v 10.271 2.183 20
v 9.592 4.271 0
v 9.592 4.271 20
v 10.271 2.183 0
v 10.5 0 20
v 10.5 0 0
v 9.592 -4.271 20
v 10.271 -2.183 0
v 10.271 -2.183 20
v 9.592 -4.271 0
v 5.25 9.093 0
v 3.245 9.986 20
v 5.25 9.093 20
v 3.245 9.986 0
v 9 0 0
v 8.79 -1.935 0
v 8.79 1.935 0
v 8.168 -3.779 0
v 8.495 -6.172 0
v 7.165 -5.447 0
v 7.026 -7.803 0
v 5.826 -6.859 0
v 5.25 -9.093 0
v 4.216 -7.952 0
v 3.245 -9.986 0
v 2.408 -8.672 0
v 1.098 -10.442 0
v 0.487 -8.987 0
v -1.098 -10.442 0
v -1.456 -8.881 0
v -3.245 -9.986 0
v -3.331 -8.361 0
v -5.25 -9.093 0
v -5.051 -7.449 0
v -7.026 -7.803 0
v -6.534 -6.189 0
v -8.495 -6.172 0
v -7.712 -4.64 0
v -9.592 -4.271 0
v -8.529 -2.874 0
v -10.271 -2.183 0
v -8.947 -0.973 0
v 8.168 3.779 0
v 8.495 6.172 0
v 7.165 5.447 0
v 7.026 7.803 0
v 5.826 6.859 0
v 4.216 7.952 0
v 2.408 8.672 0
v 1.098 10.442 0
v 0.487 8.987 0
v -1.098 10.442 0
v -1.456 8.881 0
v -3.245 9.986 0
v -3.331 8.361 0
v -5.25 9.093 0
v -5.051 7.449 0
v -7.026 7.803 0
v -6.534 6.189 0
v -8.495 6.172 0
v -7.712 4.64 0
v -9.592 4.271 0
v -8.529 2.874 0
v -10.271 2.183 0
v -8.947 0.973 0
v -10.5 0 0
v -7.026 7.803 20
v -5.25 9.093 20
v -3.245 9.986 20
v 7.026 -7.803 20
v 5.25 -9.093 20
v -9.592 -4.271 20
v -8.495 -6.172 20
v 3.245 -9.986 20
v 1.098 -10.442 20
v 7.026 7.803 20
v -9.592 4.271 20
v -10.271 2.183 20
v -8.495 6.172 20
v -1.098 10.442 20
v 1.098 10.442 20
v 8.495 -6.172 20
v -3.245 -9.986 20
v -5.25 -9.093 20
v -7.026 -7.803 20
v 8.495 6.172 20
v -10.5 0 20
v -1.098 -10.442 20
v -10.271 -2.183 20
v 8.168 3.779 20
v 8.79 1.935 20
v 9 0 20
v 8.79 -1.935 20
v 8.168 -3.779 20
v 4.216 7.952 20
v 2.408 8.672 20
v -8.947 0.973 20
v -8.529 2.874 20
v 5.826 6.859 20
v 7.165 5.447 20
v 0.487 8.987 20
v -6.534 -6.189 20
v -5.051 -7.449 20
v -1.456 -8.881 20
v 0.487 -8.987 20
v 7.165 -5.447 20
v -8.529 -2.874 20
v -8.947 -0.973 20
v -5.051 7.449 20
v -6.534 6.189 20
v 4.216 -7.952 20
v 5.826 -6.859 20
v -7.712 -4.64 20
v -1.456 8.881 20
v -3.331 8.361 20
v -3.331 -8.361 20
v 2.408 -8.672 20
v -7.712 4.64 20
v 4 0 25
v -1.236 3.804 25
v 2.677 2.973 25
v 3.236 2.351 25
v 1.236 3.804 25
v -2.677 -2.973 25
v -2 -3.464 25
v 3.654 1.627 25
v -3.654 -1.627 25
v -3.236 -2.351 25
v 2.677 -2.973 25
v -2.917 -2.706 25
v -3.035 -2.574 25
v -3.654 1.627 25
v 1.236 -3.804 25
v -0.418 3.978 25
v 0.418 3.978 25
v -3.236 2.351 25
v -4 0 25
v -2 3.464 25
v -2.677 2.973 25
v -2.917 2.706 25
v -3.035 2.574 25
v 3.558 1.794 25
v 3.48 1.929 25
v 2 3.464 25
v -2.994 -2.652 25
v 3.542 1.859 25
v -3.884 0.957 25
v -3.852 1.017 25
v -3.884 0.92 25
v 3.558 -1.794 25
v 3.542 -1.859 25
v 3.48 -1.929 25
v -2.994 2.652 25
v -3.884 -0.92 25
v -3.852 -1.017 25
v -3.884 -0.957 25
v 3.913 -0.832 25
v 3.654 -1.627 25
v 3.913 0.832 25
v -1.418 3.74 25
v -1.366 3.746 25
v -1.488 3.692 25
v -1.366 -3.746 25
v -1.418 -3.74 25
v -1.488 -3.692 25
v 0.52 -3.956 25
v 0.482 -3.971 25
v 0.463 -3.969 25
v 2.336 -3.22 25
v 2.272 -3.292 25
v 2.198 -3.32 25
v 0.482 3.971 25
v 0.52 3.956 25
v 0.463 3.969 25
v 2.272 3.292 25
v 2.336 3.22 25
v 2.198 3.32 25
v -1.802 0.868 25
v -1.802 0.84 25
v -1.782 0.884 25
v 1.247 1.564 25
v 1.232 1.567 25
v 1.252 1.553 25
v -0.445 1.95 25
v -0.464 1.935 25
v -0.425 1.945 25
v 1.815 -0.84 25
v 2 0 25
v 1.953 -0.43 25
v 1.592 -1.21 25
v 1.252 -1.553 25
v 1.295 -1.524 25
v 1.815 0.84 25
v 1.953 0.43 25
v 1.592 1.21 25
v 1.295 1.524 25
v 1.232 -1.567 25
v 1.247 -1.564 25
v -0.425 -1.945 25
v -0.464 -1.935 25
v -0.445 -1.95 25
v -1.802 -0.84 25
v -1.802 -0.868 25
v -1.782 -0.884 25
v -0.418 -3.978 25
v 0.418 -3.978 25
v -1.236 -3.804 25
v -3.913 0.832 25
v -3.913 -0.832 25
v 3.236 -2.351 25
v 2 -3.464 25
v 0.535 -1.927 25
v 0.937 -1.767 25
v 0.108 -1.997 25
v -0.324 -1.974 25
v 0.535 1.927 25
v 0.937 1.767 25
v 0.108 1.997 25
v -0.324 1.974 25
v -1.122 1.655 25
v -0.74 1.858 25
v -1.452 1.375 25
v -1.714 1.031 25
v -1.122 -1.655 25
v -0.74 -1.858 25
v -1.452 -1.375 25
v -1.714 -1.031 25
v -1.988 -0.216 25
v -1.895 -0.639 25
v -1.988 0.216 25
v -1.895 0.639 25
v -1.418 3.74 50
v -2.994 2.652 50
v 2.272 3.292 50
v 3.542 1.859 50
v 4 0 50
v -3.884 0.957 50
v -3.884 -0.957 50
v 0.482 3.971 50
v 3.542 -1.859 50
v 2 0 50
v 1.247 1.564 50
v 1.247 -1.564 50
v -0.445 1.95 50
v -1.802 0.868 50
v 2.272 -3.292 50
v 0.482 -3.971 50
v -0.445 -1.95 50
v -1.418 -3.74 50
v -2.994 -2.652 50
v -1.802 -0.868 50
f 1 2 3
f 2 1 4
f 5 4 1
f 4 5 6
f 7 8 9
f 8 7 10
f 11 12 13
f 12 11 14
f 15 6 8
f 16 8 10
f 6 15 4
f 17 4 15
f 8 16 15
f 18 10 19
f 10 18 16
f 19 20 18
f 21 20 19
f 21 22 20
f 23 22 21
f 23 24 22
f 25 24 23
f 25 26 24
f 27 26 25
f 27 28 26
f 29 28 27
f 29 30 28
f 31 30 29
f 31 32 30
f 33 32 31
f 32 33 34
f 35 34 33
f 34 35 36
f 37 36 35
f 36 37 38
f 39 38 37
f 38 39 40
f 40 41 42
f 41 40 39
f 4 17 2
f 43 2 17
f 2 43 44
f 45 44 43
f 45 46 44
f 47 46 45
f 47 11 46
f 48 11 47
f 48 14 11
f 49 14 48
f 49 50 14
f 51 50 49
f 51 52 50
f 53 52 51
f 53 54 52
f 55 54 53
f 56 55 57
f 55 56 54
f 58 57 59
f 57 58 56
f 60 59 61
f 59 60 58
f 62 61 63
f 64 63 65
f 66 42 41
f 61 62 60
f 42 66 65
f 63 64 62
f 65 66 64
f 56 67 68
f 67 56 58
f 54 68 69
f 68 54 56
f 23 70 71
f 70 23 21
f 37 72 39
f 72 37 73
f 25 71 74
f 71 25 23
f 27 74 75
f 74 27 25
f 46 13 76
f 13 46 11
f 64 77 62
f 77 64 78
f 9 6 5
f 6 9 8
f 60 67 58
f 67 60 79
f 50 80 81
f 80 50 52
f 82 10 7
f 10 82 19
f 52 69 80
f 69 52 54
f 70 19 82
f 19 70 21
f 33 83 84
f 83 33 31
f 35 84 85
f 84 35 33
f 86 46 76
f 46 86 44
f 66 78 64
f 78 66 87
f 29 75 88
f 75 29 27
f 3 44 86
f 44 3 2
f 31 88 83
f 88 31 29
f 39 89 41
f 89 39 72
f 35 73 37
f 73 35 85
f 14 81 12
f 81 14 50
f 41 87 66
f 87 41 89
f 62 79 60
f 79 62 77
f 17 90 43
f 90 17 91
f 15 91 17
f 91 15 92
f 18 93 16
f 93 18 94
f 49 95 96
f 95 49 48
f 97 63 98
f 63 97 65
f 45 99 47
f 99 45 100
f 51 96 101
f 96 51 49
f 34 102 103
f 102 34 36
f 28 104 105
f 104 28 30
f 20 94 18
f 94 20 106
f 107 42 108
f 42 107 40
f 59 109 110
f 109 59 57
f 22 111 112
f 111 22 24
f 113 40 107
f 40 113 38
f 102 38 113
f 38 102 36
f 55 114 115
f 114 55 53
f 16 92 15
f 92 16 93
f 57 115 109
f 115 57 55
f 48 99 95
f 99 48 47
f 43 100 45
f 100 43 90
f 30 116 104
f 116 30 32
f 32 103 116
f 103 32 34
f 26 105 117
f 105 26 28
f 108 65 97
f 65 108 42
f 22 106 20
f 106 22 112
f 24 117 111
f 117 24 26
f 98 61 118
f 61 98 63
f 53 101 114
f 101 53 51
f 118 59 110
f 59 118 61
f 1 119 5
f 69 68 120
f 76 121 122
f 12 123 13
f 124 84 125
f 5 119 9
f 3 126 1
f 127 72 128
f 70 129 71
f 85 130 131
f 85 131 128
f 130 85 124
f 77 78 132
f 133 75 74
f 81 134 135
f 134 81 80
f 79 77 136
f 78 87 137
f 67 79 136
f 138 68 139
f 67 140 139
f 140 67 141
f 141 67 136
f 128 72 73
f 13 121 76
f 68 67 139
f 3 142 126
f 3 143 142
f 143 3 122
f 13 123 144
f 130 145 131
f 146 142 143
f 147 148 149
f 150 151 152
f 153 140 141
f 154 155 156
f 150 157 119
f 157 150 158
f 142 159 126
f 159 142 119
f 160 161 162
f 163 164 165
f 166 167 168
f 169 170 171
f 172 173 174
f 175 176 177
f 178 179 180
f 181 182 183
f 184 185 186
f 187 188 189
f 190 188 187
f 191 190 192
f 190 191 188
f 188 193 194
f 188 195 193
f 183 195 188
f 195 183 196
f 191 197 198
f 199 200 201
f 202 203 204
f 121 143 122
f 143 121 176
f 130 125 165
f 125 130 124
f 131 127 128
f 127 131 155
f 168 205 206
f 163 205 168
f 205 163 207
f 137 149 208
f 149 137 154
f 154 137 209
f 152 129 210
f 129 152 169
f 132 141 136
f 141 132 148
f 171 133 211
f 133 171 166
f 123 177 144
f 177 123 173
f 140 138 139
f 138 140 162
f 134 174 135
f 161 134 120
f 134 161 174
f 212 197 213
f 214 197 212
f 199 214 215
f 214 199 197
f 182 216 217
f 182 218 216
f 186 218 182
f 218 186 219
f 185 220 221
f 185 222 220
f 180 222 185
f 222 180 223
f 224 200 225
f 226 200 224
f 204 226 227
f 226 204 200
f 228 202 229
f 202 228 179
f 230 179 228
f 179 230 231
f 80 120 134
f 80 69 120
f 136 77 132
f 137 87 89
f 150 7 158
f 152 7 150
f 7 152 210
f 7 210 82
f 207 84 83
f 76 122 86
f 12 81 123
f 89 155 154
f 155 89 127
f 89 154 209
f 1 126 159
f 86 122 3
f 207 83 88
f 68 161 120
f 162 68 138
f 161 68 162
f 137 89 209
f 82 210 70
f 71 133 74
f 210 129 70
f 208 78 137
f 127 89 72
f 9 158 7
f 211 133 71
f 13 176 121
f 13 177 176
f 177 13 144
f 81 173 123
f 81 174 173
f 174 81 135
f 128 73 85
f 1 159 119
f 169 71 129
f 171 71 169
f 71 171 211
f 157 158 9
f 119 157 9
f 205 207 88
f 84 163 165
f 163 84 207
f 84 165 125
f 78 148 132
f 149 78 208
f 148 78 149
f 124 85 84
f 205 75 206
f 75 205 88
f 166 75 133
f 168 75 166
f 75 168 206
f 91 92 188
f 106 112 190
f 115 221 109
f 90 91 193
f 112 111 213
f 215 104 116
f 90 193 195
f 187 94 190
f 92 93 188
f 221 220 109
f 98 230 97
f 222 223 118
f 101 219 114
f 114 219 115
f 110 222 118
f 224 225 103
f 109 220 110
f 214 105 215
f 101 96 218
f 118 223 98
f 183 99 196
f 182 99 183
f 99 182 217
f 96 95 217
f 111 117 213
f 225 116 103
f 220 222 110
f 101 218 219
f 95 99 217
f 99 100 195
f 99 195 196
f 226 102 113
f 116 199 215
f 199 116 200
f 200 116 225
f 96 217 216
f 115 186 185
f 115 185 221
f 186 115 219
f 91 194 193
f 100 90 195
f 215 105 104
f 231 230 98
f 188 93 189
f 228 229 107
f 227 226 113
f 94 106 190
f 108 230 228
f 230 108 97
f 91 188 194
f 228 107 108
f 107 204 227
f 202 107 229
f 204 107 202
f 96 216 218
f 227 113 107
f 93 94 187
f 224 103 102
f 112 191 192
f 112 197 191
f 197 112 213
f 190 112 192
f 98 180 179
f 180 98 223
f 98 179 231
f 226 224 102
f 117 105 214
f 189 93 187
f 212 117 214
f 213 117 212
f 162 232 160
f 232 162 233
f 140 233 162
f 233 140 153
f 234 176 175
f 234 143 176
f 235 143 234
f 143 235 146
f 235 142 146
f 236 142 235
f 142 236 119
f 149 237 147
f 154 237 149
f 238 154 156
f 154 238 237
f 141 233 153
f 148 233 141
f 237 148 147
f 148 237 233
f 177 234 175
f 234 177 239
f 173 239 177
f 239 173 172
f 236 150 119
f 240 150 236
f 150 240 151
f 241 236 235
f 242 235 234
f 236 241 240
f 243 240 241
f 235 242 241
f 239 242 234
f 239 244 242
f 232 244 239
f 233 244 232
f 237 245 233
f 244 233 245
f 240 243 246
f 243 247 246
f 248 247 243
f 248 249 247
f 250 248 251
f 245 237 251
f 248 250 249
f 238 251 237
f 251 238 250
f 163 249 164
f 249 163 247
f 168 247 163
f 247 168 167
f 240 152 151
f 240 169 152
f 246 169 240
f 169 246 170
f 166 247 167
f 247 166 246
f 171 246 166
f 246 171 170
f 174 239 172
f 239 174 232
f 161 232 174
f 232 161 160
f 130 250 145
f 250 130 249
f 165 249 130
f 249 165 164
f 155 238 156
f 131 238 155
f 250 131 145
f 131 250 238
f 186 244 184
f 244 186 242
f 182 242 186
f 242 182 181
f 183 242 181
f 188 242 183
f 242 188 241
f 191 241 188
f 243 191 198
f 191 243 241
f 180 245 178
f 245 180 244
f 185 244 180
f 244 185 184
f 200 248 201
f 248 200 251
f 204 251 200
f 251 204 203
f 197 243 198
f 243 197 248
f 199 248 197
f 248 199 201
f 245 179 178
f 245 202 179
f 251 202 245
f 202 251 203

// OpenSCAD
difference(){
    cylinder(h=20, d=21);
    cylinder(h=20, d=18);
}

difference(){
    translate([0, 0, 20])
    cylinder(h=5, r1=10.5, r2=4);
    translate([0, 0, 20])
    cylinder(h=5, r1=9, r2=2);
}

difference(){
    translate([0, 0, 25])
    cylinder(h=25, d=8);
    translate([0, 0, 25])
    cylinder(h=25, d=4);
}
